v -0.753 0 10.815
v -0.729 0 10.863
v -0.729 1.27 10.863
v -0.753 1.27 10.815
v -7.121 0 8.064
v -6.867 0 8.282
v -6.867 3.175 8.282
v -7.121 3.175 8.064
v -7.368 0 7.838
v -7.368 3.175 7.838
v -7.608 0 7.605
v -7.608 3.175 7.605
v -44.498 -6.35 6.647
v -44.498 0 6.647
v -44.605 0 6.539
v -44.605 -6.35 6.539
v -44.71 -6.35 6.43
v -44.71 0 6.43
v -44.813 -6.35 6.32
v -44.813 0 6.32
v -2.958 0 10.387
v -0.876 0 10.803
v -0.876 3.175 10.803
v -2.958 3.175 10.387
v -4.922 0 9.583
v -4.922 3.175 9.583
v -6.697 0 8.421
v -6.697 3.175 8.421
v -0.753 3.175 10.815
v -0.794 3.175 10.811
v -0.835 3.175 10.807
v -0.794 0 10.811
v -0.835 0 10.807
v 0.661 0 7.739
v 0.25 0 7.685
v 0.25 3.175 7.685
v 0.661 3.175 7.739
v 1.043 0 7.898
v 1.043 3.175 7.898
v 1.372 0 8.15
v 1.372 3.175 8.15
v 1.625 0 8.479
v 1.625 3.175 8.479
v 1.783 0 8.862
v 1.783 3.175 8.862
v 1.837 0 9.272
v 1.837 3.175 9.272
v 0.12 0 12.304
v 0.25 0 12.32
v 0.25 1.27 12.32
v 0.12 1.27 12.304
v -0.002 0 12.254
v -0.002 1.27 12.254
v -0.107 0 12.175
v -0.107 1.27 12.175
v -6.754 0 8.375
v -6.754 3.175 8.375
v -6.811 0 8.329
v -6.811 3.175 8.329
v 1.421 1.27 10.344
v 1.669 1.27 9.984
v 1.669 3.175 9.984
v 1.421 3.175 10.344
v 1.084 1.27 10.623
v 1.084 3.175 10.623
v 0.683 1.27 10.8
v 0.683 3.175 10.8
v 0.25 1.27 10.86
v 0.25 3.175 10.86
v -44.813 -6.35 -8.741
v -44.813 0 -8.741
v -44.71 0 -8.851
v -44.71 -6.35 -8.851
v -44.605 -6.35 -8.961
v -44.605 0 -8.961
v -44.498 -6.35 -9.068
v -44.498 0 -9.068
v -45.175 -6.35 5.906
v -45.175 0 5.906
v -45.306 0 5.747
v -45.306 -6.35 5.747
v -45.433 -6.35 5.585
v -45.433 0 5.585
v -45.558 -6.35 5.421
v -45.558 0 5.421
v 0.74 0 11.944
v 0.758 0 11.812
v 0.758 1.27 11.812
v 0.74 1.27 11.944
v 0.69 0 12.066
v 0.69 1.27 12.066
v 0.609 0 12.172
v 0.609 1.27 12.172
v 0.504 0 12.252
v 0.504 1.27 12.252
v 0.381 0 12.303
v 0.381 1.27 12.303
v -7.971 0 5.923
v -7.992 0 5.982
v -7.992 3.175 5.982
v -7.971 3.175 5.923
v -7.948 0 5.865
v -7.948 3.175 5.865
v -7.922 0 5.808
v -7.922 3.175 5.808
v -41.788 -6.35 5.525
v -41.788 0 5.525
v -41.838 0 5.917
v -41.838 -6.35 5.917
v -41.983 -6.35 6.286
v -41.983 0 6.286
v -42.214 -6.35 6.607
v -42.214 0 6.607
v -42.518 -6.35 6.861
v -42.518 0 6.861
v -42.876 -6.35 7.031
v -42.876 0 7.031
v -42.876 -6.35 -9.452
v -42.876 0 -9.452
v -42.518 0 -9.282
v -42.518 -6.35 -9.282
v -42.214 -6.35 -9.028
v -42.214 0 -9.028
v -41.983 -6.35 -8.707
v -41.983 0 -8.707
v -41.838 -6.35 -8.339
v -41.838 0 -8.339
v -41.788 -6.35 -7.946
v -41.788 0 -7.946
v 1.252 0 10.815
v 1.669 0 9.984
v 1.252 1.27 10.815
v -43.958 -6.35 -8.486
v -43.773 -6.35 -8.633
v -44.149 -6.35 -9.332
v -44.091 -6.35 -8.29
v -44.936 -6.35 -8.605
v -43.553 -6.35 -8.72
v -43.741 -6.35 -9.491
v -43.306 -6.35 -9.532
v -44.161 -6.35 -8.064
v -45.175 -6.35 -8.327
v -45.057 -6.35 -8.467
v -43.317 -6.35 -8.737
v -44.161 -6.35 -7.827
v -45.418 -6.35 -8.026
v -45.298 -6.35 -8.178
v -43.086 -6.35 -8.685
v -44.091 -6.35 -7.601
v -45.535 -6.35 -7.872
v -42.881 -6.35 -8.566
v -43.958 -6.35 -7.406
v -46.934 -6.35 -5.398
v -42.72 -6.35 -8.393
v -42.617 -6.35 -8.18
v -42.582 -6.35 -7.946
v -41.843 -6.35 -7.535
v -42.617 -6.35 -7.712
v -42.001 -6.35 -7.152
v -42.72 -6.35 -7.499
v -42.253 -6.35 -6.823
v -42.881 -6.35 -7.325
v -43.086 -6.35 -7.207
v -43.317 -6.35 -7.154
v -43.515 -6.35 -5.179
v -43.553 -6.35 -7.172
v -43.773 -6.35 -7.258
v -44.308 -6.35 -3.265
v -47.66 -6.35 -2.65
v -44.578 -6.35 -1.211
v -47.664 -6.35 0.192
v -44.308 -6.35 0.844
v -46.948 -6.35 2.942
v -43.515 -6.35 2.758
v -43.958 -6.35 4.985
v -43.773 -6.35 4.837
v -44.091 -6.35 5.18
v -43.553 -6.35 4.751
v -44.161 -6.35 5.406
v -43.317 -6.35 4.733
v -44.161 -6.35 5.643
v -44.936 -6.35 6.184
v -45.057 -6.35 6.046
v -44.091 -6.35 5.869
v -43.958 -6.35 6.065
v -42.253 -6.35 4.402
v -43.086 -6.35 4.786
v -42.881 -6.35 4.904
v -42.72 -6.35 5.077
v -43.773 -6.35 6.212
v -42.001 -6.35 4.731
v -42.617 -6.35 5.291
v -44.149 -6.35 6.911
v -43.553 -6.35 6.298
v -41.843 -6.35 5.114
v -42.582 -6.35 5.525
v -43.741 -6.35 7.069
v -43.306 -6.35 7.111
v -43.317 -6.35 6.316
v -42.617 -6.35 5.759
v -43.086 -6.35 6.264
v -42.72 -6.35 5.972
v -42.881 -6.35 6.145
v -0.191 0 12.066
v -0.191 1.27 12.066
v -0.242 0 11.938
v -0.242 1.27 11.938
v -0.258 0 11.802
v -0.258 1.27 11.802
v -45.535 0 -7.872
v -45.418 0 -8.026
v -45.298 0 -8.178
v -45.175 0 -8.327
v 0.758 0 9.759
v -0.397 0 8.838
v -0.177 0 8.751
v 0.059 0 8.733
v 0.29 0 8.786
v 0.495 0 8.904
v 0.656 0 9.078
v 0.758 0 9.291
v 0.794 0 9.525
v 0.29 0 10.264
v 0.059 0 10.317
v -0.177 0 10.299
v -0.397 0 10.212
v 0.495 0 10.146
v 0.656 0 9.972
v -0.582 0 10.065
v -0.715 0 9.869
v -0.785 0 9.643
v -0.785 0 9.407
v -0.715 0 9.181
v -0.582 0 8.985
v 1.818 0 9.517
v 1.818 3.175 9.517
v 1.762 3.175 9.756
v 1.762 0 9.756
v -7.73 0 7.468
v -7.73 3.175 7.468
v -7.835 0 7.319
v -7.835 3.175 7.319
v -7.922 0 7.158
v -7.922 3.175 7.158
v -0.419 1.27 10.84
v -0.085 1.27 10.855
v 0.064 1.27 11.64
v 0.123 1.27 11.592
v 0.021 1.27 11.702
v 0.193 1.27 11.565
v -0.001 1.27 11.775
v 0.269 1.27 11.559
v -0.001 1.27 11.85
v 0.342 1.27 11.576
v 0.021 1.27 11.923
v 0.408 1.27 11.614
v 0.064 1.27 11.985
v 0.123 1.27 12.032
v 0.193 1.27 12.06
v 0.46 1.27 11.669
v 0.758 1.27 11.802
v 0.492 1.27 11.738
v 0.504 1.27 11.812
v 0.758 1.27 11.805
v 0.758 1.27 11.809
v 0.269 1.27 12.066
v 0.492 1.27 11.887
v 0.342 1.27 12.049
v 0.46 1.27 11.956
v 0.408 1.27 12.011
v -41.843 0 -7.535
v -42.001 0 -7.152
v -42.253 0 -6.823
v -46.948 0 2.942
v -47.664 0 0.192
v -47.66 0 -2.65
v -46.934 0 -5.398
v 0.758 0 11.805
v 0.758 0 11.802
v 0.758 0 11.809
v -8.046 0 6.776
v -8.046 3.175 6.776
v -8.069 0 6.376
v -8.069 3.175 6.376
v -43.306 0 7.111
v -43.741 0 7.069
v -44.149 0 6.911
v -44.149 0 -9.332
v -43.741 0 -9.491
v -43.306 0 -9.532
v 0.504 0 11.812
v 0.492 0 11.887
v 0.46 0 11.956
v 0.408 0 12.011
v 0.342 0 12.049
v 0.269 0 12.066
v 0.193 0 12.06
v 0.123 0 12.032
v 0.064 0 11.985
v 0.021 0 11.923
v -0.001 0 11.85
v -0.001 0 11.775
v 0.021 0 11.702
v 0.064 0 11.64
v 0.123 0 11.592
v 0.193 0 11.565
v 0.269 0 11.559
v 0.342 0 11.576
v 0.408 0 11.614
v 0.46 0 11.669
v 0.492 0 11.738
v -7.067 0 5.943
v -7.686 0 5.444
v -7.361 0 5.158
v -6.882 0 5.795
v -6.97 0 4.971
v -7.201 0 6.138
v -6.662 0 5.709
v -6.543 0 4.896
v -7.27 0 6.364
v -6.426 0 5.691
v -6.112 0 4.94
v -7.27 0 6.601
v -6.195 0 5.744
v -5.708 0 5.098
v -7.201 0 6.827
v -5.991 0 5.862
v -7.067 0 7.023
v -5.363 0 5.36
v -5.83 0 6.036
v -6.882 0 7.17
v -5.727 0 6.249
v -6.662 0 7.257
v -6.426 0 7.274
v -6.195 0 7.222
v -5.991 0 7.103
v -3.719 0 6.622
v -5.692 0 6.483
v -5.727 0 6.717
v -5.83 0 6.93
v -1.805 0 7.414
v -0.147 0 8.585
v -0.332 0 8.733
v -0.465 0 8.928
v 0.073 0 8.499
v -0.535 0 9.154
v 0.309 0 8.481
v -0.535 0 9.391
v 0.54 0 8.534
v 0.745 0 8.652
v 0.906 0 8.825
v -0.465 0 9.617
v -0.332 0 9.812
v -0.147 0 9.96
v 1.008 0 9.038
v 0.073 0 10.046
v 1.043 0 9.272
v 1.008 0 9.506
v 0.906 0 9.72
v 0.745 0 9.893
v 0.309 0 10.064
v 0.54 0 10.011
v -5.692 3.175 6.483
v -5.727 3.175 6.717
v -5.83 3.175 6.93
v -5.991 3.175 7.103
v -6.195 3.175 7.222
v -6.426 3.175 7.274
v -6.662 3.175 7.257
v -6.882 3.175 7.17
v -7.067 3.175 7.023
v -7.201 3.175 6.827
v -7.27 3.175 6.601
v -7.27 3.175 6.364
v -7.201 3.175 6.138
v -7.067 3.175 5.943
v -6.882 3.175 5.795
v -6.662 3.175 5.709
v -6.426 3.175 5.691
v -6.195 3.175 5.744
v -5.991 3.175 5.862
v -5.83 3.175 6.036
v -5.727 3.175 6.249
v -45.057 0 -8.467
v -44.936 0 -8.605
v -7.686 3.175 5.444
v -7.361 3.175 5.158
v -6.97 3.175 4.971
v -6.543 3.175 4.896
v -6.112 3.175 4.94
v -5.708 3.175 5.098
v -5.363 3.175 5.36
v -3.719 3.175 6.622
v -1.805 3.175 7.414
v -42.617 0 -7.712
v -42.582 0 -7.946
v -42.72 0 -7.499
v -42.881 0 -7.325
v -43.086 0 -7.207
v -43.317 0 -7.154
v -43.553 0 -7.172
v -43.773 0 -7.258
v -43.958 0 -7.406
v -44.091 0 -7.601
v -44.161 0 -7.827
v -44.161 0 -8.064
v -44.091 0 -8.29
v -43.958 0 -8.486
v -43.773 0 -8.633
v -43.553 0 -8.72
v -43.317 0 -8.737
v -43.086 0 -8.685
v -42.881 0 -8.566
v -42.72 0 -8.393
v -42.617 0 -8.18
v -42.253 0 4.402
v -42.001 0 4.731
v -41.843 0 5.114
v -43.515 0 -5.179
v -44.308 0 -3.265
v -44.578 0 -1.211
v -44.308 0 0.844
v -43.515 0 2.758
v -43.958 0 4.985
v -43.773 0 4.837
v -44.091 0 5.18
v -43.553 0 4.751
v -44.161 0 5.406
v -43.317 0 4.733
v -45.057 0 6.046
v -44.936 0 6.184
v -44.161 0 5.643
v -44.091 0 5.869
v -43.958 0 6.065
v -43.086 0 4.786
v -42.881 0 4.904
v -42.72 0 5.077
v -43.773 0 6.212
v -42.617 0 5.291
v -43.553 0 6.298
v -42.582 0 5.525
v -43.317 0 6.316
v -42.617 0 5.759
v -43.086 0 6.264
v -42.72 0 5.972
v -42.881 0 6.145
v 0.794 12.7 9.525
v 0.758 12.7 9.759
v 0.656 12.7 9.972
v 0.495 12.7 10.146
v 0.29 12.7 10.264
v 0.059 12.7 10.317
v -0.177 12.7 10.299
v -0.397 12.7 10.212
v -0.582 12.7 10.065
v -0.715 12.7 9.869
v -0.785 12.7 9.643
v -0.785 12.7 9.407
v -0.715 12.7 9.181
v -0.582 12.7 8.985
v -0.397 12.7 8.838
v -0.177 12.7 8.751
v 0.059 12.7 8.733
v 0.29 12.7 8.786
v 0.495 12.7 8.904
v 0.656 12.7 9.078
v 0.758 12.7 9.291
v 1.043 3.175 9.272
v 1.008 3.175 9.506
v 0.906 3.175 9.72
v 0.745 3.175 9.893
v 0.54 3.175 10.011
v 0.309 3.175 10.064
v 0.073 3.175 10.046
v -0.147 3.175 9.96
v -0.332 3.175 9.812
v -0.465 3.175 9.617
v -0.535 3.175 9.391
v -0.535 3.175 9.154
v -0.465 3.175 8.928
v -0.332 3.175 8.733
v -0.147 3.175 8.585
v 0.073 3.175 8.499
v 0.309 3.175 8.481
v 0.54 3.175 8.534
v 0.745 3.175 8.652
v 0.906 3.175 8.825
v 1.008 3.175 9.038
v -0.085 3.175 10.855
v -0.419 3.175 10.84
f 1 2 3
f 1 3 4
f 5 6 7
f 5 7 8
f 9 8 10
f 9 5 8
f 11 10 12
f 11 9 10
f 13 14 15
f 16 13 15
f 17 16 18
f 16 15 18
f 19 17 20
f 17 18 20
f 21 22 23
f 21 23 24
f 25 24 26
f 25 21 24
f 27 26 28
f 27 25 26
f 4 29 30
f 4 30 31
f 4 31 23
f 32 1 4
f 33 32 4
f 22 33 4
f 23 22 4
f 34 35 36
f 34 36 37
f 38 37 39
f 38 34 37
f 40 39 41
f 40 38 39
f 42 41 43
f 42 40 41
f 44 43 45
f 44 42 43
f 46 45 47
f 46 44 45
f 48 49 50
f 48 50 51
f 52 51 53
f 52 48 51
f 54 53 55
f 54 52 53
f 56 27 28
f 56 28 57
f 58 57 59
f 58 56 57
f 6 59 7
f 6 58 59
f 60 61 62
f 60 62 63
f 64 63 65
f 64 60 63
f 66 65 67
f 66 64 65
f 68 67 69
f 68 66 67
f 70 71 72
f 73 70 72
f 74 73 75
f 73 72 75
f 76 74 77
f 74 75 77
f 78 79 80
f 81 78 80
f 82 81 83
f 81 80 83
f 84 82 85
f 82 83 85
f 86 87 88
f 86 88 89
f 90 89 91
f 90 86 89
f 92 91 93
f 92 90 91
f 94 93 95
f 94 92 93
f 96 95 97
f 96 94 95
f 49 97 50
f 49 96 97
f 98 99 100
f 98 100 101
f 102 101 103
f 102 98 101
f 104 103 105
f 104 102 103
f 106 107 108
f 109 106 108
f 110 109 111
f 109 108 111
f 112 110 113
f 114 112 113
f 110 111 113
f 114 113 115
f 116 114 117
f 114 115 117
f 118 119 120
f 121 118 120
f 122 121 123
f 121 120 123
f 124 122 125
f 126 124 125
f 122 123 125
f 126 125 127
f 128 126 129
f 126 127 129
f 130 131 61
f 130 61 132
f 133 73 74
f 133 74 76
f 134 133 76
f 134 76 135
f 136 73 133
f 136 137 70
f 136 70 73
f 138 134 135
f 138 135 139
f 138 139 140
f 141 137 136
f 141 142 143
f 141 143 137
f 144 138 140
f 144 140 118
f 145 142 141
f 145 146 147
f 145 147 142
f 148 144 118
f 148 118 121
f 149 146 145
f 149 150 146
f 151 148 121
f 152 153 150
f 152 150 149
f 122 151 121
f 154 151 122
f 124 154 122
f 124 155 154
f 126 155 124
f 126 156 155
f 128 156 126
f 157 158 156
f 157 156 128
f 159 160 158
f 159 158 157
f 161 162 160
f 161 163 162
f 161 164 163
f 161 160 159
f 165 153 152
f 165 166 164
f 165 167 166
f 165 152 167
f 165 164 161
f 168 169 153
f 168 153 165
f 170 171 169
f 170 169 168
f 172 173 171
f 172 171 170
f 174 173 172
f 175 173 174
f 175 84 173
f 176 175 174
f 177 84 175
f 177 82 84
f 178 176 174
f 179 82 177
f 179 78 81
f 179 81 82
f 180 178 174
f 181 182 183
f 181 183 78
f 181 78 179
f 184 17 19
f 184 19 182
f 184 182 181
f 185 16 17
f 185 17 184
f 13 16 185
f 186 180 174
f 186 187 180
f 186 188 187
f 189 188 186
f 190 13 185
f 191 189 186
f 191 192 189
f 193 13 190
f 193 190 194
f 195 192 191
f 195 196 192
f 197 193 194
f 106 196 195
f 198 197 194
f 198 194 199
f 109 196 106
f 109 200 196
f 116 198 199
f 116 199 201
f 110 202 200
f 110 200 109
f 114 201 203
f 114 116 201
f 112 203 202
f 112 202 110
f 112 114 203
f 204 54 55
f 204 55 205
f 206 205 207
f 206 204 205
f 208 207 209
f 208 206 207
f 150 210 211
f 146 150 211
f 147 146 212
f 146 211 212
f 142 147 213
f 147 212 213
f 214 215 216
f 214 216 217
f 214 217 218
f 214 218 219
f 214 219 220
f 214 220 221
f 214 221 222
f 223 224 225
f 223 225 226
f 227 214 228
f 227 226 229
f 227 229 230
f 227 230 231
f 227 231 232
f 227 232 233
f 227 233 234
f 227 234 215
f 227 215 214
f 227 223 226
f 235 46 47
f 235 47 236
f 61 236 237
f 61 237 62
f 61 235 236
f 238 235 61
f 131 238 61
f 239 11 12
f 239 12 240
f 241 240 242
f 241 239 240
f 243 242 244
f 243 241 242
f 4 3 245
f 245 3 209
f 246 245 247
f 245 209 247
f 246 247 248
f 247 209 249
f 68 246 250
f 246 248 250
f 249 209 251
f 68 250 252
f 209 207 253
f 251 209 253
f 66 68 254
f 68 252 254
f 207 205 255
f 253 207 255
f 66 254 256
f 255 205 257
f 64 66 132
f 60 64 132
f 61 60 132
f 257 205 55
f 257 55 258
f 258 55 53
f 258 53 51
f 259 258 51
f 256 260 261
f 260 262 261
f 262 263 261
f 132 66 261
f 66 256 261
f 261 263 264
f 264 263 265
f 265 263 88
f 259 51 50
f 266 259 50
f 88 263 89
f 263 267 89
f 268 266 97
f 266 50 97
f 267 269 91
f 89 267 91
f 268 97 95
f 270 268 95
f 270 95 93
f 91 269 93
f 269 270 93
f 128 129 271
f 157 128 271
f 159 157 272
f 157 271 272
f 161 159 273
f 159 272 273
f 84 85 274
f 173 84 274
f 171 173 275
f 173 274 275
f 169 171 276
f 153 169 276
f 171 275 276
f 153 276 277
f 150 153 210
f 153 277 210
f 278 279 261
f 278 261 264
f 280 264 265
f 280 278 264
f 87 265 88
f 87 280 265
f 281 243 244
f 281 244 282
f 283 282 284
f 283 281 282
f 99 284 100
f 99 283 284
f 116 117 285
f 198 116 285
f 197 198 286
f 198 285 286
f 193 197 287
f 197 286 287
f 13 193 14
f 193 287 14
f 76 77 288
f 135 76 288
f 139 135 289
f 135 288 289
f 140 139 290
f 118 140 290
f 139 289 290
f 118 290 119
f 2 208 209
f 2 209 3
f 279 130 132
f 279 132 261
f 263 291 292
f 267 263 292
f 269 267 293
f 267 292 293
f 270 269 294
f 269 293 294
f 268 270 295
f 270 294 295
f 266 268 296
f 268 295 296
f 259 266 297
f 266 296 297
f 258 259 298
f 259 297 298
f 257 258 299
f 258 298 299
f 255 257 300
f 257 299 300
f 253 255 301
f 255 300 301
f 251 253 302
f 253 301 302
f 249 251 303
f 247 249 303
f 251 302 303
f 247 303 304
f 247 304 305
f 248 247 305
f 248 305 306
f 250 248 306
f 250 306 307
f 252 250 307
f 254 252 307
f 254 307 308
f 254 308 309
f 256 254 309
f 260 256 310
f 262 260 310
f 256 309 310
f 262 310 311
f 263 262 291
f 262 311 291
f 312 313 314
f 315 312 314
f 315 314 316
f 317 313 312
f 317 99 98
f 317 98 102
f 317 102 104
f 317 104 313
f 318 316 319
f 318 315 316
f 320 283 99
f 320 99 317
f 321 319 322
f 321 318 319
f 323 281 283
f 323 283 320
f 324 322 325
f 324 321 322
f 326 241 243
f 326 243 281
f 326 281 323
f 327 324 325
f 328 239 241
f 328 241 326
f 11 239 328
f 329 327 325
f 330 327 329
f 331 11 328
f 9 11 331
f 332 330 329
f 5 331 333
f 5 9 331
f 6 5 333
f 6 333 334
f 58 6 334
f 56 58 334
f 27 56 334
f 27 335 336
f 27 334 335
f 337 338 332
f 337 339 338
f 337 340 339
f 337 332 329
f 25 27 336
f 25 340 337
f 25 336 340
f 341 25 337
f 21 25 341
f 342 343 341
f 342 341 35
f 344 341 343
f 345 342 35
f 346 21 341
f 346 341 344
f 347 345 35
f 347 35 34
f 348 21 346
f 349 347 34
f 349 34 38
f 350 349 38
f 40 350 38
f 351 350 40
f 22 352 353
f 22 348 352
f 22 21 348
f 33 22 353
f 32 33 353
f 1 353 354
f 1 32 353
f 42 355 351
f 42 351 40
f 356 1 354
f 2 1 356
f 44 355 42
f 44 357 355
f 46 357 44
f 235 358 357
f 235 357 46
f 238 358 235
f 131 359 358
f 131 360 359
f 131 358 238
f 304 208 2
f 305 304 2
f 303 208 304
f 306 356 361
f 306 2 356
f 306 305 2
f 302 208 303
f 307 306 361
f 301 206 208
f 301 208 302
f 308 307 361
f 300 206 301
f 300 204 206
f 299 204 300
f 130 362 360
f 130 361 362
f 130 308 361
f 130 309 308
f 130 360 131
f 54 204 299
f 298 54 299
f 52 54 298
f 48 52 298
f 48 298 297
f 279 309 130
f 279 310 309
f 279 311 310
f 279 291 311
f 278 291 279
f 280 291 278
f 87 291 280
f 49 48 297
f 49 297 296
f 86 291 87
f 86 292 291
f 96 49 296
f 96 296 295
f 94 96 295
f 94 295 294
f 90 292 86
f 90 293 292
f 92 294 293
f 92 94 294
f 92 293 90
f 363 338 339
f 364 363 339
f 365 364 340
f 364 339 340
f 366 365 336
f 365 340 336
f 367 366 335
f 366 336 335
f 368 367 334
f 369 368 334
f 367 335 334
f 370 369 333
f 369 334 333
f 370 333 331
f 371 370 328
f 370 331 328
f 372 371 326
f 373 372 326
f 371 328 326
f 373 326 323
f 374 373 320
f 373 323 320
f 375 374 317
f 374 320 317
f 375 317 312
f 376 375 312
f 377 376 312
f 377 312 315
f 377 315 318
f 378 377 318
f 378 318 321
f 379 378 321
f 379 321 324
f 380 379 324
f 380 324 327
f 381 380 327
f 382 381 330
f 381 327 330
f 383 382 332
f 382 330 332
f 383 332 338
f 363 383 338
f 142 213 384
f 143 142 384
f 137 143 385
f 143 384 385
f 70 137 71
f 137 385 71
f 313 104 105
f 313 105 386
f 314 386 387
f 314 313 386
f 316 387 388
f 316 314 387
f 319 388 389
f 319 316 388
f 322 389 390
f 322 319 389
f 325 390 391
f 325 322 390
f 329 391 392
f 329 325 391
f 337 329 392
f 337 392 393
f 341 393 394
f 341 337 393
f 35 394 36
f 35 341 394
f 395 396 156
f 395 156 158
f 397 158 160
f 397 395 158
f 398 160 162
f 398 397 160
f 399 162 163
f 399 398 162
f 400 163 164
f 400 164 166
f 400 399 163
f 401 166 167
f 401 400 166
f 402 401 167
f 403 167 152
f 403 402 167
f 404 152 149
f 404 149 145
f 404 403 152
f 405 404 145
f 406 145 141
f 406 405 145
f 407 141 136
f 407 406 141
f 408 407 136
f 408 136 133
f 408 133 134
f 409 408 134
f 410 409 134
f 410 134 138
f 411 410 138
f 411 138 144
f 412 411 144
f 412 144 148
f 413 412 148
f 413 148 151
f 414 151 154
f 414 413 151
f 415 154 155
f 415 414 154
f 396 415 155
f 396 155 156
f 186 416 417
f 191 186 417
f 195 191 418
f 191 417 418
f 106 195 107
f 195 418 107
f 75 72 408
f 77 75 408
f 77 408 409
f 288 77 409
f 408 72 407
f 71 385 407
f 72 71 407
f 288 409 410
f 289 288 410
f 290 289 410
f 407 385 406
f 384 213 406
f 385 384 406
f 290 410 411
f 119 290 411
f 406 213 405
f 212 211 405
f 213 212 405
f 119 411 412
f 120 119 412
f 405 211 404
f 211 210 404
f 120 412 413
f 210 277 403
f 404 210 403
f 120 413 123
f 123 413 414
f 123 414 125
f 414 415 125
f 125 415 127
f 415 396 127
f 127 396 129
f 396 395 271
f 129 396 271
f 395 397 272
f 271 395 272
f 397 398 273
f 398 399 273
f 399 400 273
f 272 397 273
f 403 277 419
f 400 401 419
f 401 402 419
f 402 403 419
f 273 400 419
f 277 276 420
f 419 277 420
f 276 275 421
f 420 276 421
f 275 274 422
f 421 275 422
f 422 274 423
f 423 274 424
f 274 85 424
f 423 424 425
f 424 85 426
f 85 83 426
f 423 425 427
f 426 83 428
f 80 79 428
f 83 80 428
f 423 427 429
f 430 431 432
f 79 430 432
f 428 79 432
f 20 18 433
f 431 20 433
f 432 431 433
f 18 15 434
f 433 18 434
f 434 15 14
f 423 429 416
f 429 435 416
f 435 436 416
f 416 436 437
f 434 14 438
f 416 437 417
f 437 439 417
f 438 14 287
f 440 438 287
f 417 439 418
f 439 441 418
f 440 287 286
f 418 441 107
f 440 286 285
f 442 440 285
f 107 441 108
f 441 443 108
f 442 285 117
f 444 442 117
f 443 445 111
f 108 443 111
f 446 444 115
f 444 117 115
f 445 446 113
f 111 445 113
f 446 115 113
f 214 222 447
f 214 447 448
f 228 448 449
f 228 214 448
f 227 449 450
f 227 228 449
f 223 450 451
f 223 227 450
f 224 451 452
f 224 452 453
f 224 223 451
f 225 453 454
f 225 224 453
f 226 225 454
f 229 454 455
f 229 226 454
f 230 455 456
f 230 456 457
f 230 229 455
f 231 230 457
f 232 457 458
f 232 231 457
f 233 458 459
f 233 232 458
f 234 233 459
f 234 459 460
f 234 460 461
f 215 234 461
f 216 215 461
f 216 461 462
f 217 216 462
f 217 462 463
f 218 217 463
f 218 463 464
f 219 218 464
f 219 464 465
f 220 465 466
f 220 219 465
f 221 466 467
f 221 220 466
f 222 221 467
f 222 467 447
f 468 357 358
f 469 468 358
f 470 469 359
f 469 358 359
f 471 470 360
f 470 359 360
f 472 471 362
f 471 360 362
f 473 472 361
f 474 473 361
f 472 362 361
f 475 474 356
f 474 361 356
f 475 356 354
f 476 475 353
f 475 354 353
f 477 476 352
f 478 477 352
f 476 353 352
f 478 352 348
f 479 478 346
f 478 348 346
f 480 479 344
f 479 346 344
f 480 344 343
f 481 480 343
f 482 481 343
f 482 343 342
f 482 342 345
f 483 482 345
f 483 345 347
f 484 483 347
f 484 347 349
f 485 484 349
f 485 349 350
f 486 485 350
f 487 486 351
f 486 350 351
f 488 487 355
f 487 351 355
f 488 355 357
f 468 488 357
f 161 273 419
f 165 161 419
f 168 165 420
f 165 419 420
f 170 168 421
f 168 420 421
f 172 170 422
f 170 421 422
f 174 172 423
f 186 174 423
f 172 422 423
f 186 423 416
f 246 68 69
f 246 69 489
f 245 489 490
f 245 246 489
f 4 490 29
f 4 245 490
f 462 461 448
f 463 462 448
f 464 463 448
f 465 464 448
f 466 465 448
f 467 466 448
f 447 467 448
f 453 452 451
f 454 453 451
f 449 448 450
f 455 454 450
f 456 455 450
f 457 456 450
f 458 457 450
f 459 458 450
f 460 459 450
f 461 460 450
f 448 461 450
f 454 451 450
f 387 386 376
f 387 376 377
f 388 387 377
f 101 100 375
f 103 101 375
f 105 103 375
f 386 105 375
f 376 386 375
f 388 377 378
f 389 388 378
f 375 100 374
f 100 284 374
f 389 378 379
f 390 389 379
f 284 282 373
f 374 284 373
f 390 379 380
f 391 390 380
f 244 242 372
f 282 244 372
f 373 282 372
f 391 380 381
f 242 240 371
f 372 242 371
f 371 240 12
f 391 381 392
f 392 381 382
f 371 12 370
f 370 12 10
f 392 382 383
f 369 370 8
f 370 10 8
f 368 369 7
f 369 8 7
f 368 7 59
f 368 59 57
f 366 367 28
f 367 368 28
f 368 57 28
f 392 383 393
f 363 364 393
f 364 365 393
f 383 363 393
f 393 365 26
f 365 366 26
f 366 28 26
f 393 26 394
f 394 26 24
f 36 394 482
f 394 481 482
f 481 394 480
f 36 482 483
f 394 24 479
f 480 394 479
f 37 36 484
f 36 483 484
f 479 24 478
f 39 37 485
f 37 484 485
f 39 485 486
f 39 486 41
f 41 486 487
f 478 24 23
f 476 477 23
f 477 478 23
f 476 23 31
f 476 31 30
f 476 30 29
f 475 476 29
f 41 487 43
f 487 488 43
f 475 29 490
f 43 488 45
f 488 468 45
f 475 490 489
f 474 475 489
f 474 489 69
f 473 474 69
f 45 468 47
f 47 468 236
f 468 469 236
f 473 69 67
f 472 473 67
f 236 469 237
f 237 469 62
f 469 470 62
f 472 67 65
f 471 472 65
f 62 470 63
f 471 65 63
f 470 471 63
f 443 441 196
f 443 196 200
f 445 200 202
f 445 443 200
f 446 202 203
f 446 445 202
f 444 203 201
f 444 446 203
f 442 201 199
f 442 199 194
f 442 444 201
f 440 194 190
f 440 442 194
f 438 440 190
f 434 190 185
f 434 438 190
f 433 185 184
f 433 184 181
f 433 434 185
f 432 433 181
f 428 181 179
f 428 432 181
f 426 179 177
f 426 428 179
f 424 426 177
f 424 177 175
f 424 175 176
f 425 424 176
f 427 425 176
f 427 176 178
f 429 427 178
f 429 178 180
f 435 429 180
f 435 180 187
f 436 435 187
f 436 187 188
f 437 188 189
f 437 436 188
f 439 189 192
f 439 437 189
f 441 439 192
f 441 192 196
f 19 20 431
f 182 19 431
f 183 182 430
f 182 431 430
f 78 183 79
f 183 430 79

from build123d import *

# Parameters (mm, degrees)
F0_R     = 0.79375
F2_DEPTH = 12.7
F1_R     = 0.79375
F3_DEPTH = 3.175
F1_R_2   = 0.254
F4_DEPTH = 1.27
F5_R     = 0.79375
F6_DEPTH = 6.35


with BuildPart() as f2:
    # F0 (on Front) → F2 (new body)
    with BuildSketch(Plane.XZ):
        with Locations((0, 9.525)):
            Circle(F0_R)
    extrude(amount=-F2_DEPTH)


with BuildPart() as f3:
    # F1 (on Front) → F3 (new body)
    with BuildSketch(Plane.XZ):
        with BuildLine():
            ThreePointArc((-1.1694463436, 9.9839179202), (-1.1011480712, 8.4385785178), (0.2497026876, 7.6849600799))
            ThreePointArc((0.2497026876, 7.6849600799), (1.372234707, 8.1499280624), (1.8372026942, 9.2724600799))
            ThreePointArc((1.8372026942, 9.2724600799), (1.7945417388, 9.638012506), (1.668851732, 9.9839179202))
            ThreePointArc((1.668851732, 9.9839179202), (1.0835842591, 10.6233108435), (0.2497026942, 10.8599600799))
            ThreePointArc((0.2497026942, 10.8599600799), (-0.5841788707, 10.6233108435), (-1.1694463436, 9.9839179202))
        make_face()
        with Locations((0.2497026942, 9.2724600799)):
            Circle(F1_R, mode=Mode.SUBTRACT)
        with BuildLine():
            ThreePointArc((-5.3629573815, 5.3601201555), (-2.7878470533, 7.0807538679), (0.2497026876, 7.6849600799))
            ThreePointArc((0.2497026876, 7.6849600799), (-1.1011480712, 8.4385785178), (-1.1694463436, 9.9839179202))
            Line((-1.1694463436, 9.9839179202), (-0.7529874614, 10.8146308431))
            ThreePointArc((-0.7529874614, 10.8146308431), (-0.8147178245, 10.8088643854), (-0.8764150546, 10.8027536113))
            Line((-0.8764150546, 10.8027536113), (-6.6973281316, 8.420776571))
            ThreePointArc((-6.6973281316, 8.420776571), (-6.7824856126, 8.3518766126), (-6.8669597926, 8.2821405835))
            Line((-6.8669597926, 8.2821405835), (-5.9850761519, 7.9892187422))
            ThreePointArc((-5.9850761519, 7.9892187422), (-5.1981350794, 7.4115628833), (-4.8979893966, 6.4826521707))
            ThreePointArc((-4.8979893966, 6.4826521707), (-5.0188306388, 5.8751422218), (-5.3629573815, 5.3601201555))
        make_face()
        with BuildLine():
            Line((-0.7529874614, 10.8146308431), (-1.1694463436, 9.9839179202))
            ThreePointArc((-1.1694463436, 9.9839179202), (-0.5841788707, 10.6233108435), (0.2497026942, 10.8599600799))
            ThreePointArc((0.2497026942, 10.8599600799), (-0.2521544289, 10.8486219865), (-0.7529874614, 10.8146308431))
        make_face()
        with BuildLine():
            ThreePointArc((-7.6080214168, 7.6051841808), (-6.8510418262, 8.0274912145), (-5.9850761519, 7.9892187422))
            Line((-5.9850761519, 7.9892187422), (-6.8669597926, 8.2821405835))
            ThreePointArc((-6.8669597926, 8.2821405835), (-7.2451375968, 7.9520335156), (-7.6080214168, 7.6051841808))
        make_face()
        with BuildLine():
            ThreePointArc((-7.922330376, 5.8076379116), (-6.7589223258, 4.9188776718), (-5.3629573815, 5.3601201555))
            ThreePointArc((-5.3629573815, 5.3601201555), (-5.0188306388, 5.8751422218), (-4.8979893966, 6.4826521707))
            ThreePointArc((-4.8979893966, 6.4826521707), (-5.1981350794, 7.4115628833), (-5.9850761519, 7.9892187422))
            ThreePointArc((-5.9850761519, 7.9892187422), (-6.8510418262, 8.0274912145), (-7.6080214168, 7.6051841808))
            ThreePointArc((-7.6080214168, 7.6051841808), (-7.7845912294, 7.3950614418), (-7.922330376, 7.1576664298))
            Line((-7.922330376, 7.1576664298), (-7.922330376, 5.8076379116))
        make_face()
        with Locations((-6.4854893966, 6.4826521707)):
            Circle(F1_R, mode=Mode.SUBTRACT)
        with BuildLine():
            ThreePointArc((-7.9920559682, 5.9822389259), (-7.9597802028, 5.8939053076), (-7.922330376, 5.8076379116))
            Line((-7.922330376, 5.8076379116), (-7.922330376, 7.1576664298))
            ThreePointArc((-7.922330376, 7.1576664298), (-8.0702037106, 6.5766563892), (-7.9920559682, 5.9822389259))
        make_face()
        with BuildLine():
            Line((-6.6973281316, 8.420776571), (-0.8764150546, 10.8027536113))
            ThreePointArc((-0.8764150546, 10.8027536113), (-3.9589058207, 10.0321706066), (-6.6973281316, 8.420776571))
        make_face()
    extrude(amount=-F3_DEPTH)

    # F1 (on Front) → F4 (join)
    with BuildSketch(Plane.XZ):
        with BuildLine():
            ThreePointArc((-0.7529874614, 10.8146308431), (-0.2521544289, 10.8486219865), (0.2497026942, 10.8599600799))
            ThreePointArc((0.2497026942, 10.8599600799), (0.7515598172, 10.8486219865), (1.2523928497, 10.8146308431))
            Line((1.2523928497, 10.8146308431), (0.7575870828, 11.8016227465))
            ThreePointArc((0.7575870828, 11.8016227465), (0.2497026942, 11.3044600799), (-0.2581816944, 11.8016227465))
            Line((-0.2581816944, 11.8016227465), (-0.7286224611, 10.8632318489))
            Line((-0.7286224611, 10.8632318489), (-0.7529874614, 10.8146308431))
        make_face()
        with BuildLine():
            ThreePointArc((-0.2581816944, 11.8016227465), (0.2497026942, 11.3044600799), (0.7575870828, 11.8016227465))
            ThreePointArc((0.7575870828, 11.8016227465), (0.7576737905, 11.8070411049), (0.7577026942, 11.8124600799))
            ThreePointArc((0.7577026942, 11.8124600799), (0.608912939, 12.1716703247), (0.2497026942, 12.3204600799))
            Line((0.2497026942, 12.3204600799), (-0.1065487401, 12.1746049619))
            ThreePointArc((-0.1065487401, 12.1746049619), (-0.2208943876, 12.0037775821), (-0.2581816944, 11.8016227465))
        make_face()
        with Locations((0.2497026942, 11.8124600799)):
            Circle(F1_R_2, mode=Mode.SUBTRACT)
        with BuildLine():
            ThreePointArc((1.2523928497, 10.8146308431), (0.7515598172, 10.8486219865), (0.2497026942, 10.8599600799))
            ThreePointArc((0.2497026942, 10.8599600799), (1.0835842591, 10.6233108435), (1.668851732, 9.9839179202))
            Line((1.668851732, 9.9839179202), (1.2523928497, 10.8146308431))
        make_face()
        with BuildLine():
            ThreePointArc((0.2497026942, 12.3204600799), (0.0572262022, 12.2825843188), (-0.1065487401, 12.1746049619))
            Line((-0.1065487401, 12.1746049619), (0.2497026942, 12.3204600799))
        make_face()
    extrude(amount=-F4_DEPTH)


with BuildPart() as f6:
    # F5 (on Front) → F6 (new body)
    with BuildSketch(Plane.XZ):
        with BuildLine():
            ThreePointArc((-44.8127825507, 4.8496123106), (-43.6493745005, 3.9608520708), (-42.2534095562, 4.4020945545))
            ThreePointArc((-42.2534095562, 4.4020945545), (-41.9092828135, 4.9171166208), (-41.7884415713, 5.5246265697))
            ThreePointArc((-41.7884415713, 5.5246265697), (-42.0885872541, 6.4535372823), (-42.8755283266, 7.0311931412))
            ThreePointArc((-42.8755283266, 7.0311931412), (-43.7414940065, 7.0694656121), (-44.4984735996, 6.6471585717))
            ThreePointArc((-44.4984735996, 6.6471585717), (-44.6750434074, 6.4370358361), (-44.8127825507, 6.1996408288))
            Line((-44.8127825507, 6.1996408288), (-44.8127825507, 4.8496123106))
        make_face()
        with Locations((-43.3759415713, 5.5246265697)):
            Circle(F5_R, mode=Mode.SUBTRACT)
        with BuildLine():
            ThreePointArc((-44.8825081429, 5.0242133249), (-44.8502323775, 4.9358797066), (-44.8127825507, 4.8496123106))
            Line((-44.8127825507, 4.8496123106), (-44.8127825507, 6.1996408288))
            ThreePointArc((-44.8127825507, 6.1996408288), (-44.9606558853, 5.6186307882), (-44.8825081429, 5.0242133249))
        make_face()
        with BuildLine():
            Line((-45.1754299842, 5.9060969657), (-44.8825081429, 5.0242133249))
            ThreePointArc((-44.8825081429, 5.0242133249), (-44.9606558853, 5.6186307882), (-44.8127825507, 6.1996408288))
            Line((-44.8127825507, 6.1996408288), (-44.8127825507, 6.3197420257))
            ThreePointArc((-44.8127825507, 6.3197420257), (-44.9966662566, 6.1151638679), (-45.1754299842, 5.9060969657))
        make_face()
        with BuildLine():
            Line((-44.8127825507, -7.2707433528), (-44.8127825507, 4.8496123106))
            ThreePointArc((-44.8127825507, 4.8496123106), (-44.8502323775, 4.9358797066), (-44.8825081429, 5.0242133249))
            Line((-44.8825081429, 5.0242133249), (-45.1754299842, 5.9060969657))
            ThreePointArc((-45.1754299842, 5.9060969657), (-45.3698726123, 5.6662117473), (-45.5575749166, 5.4210165218))
            Line((-45.5575749166, 5.4210165218), (-45.5349894408, -7.8724084927))
            ThreePointArc((-45.5349894408, -7.8724084927), (-45.3581764135, -8.1021635882), (-45.1754299842, -8.3272280079))
            Line((-45.1754299842, -8.3272280079), (-44.8825081429, -7.4453443672))
            ThreePointArc((-44.8825081429, -7.4453443672), (-44.8502323775, -7.3570107489), (-44.8127825507, -7.2707433528))
        make_face()
        with BuildLine():
            Line((-45.5349894408, -7.8724084927), (-45.5575749166, 5.4210165218))
            ThreePointArc((-45.5575749166, 5.4210165218), (-47.753233442, -1.2294455868), (-45.5349894408, -7.8724084927))
        make_face()
        with BuildLine():
            ThreePointArc((-42.2534095562, -6.8232255968), (-44.5782494805, -1.2105655211), (-42.2534095562, 4.4020945545))
            ThreePointArc((-42.2534095562, 4.4020945545), (-43.6493745005, 3.9608520708), (-44.8127825507, 4.8496123106))
            Line((-44.8127825507, 4.8496123106), (-44.8127825507, -7.2707433528))
            ThreePointArc((-44.8127825507, -7.2707433528), (-43.6493745005, -6.3819831131), (-42.2534095562, -6.8232255968))
        make_face()
        with BuildLine():
            Line((-44.8127825507, 6.3197420257), (-44.8127825507, 6.1996408288))
            ThreePointArc((-44.8127825507, 6.1996408288), (-44.6750434074, 6.4370358361), (-44.4984735996, 6.6471585717))
            ThreePointArc((-44.4984735996, 6.6471585717), (-44.6572998162, 6.4850551143), (-44.8127825507, 6.3197420257))
        make_face()
        with BuildLine():
            ThreePointArc((-41.7884415713, -7.9457576119), (-41.9092828135, -7.3382476631), (-42.2534095562, -6.8232255968))
            ThreePointArc((-42.2534095562, -6.8232255968), (-43.6493745005, -6.3819831131), (-44.8127825507, -7.2707433528))
            Line((-44.8127825507, -7.2707433528), (-44.8127825507, -8.620771871))
            ThreePointArc((-44.8127825507, -8.620771871), (-44.6750434095, -8.8581668754), (-44.4984736046, -9.0682896089))
            ThreePointArc((-44.4984736046, -9.0682896089), (-43.7414940099, -9.4905966536), (-42.8755283266, -9.4523241835))
            ThreePointArc((-42.8755283266, -9.4523241835), (-42.0885872541, -8.8746683245), (-41.7884415713, -7.9457576119))
        make_face()
        with Locations((-43.3759415713, -7.9457576119)):
            Circle(F5_R, mode=Mode.SUBTRACT)
        with BuildLine():
            Line((-44.8127825507, -8.620771871), (-44.8127825507, -7.2707433528))
            ThreePointArc((-44.8127825507, -7.2707433528), (-44.8502323775, -7.3570107489), (-44.8825081429, -7.4453443672))
            ThreePointArc((-44.8825081429, -7.4453443672), (-44.9606558853, -8.0397618305), (-44.8127825507, -8.620771871))
        make_face()
        with BuildLine():
            ThreePointArc((-44.8127825507, -8.620771871), (-44.9606558853, -8.0397618305), (-44.8825081429, -7.4453443672))
            Line((-44.8825081429, -7.4453443672), (-45.1754299842, -8.3272280079))
            ThreePointArc((-45.1754299842, -8.3272280079), (-44.9966662566, -8.5362949102), (-44.8127825507, -8.740873068))
            Line((-44.8127825507, -8.740873068), (-44.8127825507, -8.620771871))
        make_face()
        with BuildLine():
            ThreePointArc((-44.4984736046, -9.0682896089), (-44.6750434095, -8.8581668754), (-44.8127825507, -8.620771871))
            Line((-44.8127825507, -8.620771871), (-44.8127825507, -8.740873068))
            ThreePointArc((-44.8127825507, -8.740873068), (-44.6572998187, -8.906186154), (-44.4984736046, -9.0682896089))
        make_face()
    extrude(amount=F6_DEPTH)


solid = Compound([f2.part, f3.part, f6.part])
